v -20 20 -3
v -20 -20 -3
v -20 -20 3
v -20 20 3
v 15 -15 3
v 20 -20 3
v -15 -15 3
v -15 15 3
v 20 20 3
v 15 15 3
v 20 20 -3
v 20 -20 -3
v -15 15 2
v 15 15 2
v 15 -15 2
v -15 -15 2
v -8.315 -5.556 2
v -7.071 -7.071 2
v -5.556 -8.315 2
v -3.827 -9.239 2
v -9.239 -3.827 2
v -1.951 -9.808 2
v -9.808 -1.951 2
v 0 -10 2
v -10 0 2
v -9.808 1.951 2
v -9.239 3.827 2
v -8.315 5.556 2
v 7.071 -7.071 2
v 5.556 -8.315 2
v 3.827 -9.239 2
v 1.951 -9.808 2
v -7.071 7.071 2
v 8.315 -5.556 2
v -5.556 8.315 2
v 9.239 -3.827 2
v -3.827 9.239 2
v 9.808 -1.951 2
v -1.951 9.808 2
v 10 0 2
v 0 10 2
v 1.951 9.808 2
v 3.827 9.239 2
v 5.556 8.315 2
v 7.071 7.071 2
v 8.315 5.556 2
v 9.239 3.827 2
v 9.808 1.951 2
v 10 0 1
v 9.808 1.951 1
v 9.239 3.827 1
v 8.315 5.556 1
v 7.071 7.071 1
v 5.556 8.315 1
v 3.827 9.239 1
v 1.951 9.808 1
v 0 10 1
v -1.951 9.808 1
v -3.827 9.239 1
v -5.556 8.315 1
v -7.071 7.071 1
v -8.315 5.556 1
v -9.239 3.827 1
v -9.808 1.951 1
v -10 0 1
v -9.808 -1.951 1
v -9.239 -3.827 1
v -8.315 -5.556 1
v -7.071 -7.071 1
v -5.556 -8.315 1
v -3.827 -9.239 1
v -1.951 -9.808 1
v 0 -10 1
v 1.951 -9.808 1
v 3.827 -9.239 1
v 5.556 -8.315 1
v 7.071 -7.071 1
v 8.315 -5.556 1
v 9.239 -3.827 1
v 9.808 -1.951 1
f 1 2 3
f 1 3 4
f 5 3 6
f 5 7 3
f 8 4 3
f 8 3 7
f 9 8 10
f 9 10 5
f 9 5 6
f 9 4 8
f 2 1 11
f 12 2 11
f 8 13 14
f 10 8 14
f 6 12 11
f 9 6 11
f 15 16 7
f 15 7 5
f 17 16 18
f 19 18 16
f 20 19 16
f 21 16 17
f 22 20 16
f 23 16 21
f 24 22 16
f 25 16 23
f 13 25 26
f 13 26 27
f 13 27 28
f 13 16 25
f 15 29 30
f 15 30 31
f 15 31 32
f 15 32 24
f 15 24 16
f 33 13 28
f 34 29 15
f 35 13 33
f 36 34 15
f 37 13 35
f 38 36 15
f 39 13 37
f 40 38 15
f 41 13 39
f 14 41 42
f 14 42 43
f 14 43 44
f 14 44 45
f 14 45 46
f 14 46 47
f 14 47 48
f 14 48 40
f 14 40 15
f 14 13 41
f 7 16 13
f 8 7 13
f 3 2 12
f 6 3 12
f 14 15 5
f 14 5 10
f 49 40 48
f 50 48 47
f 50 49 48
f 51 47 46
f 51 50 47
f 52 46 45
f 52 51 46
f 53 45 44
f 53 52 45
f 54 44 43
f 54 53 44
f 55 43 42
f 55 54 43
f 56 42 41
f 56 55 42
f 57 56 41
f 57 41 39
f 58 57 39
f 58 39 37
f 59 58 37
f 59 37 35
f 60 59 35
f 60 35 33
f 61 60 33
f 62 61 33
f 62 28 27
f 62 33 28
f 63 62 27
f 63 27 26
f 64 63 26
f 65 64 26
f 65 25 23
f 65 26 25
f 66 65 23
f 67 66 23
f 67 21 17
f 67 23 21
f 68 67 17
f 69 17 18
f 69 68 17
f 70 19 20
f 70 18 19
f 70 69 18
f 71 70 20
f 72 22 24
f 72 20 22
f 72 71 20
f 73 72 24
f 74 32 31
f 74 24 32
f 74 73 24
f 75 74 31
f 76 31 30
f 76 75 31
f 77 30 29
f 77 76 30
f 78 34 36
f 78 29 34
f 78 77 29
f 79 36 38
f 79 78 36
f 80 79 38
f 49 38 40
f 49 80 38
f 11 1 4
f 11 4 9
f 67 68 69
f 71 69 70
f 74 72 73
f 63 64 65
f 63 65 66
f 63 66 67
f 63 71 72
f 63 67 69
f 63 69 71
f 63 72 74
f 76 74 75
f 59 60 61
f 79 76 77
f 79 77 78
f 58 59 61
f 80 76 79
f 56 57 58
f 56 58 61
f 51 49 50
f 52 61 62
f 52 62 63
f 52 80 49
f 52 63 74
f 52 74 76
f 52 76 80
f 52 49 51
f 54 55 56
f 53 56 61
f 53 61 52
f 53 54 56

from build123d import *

# Parameters (mm, degrees)
CUBE001_W      = 30
CUBE001_H      = 30
CUBE001_DEPTH  = 1
CYLINDER_R     = 10
CYLINDER_DEPTH = 2
CUBE_W         = 40
CUBE_H         = 40
CUBE_DEPTH     = 6


with BuildPart() as cube001:
    # cube001 → cube001 (new body)
    with BuildSketch(Plane(origin=(-15, -15, 2), x_dir=(1, 0, 0), z_dir=(0, 0, 1))):
        with Locations((15, 15)):
            Rectangle(CUBE001_W, CUBE001_H)
    extrude(amount=CUBE001_DEPTH)


with BuildPart() as union:
    # cylinder → cylinder (new body)
    with BuildSketch(Plane.XY.offset(1)):
        Circle(CYLINDER_R)
    extrude(amount=CYLINDER_DEPTH)

    # union: union cube001
    add(cube001.part)


with BuildPart() as difference:
    # cube → cube (new body)
    with BuildSketch(Plane(origin=(-20, -20, -3), x_dir=(1, 0, 0), z_dir=(0, 0, 1))):
        with Locations((20, 20)):
            Rectangle(CUBE_W, CUBE_H)
    extrude(amount=CUBE_DEPTH)

    # difference: cut union
    add(union.part, mode=Mode.SUBTRACT)


solid = difference.part
